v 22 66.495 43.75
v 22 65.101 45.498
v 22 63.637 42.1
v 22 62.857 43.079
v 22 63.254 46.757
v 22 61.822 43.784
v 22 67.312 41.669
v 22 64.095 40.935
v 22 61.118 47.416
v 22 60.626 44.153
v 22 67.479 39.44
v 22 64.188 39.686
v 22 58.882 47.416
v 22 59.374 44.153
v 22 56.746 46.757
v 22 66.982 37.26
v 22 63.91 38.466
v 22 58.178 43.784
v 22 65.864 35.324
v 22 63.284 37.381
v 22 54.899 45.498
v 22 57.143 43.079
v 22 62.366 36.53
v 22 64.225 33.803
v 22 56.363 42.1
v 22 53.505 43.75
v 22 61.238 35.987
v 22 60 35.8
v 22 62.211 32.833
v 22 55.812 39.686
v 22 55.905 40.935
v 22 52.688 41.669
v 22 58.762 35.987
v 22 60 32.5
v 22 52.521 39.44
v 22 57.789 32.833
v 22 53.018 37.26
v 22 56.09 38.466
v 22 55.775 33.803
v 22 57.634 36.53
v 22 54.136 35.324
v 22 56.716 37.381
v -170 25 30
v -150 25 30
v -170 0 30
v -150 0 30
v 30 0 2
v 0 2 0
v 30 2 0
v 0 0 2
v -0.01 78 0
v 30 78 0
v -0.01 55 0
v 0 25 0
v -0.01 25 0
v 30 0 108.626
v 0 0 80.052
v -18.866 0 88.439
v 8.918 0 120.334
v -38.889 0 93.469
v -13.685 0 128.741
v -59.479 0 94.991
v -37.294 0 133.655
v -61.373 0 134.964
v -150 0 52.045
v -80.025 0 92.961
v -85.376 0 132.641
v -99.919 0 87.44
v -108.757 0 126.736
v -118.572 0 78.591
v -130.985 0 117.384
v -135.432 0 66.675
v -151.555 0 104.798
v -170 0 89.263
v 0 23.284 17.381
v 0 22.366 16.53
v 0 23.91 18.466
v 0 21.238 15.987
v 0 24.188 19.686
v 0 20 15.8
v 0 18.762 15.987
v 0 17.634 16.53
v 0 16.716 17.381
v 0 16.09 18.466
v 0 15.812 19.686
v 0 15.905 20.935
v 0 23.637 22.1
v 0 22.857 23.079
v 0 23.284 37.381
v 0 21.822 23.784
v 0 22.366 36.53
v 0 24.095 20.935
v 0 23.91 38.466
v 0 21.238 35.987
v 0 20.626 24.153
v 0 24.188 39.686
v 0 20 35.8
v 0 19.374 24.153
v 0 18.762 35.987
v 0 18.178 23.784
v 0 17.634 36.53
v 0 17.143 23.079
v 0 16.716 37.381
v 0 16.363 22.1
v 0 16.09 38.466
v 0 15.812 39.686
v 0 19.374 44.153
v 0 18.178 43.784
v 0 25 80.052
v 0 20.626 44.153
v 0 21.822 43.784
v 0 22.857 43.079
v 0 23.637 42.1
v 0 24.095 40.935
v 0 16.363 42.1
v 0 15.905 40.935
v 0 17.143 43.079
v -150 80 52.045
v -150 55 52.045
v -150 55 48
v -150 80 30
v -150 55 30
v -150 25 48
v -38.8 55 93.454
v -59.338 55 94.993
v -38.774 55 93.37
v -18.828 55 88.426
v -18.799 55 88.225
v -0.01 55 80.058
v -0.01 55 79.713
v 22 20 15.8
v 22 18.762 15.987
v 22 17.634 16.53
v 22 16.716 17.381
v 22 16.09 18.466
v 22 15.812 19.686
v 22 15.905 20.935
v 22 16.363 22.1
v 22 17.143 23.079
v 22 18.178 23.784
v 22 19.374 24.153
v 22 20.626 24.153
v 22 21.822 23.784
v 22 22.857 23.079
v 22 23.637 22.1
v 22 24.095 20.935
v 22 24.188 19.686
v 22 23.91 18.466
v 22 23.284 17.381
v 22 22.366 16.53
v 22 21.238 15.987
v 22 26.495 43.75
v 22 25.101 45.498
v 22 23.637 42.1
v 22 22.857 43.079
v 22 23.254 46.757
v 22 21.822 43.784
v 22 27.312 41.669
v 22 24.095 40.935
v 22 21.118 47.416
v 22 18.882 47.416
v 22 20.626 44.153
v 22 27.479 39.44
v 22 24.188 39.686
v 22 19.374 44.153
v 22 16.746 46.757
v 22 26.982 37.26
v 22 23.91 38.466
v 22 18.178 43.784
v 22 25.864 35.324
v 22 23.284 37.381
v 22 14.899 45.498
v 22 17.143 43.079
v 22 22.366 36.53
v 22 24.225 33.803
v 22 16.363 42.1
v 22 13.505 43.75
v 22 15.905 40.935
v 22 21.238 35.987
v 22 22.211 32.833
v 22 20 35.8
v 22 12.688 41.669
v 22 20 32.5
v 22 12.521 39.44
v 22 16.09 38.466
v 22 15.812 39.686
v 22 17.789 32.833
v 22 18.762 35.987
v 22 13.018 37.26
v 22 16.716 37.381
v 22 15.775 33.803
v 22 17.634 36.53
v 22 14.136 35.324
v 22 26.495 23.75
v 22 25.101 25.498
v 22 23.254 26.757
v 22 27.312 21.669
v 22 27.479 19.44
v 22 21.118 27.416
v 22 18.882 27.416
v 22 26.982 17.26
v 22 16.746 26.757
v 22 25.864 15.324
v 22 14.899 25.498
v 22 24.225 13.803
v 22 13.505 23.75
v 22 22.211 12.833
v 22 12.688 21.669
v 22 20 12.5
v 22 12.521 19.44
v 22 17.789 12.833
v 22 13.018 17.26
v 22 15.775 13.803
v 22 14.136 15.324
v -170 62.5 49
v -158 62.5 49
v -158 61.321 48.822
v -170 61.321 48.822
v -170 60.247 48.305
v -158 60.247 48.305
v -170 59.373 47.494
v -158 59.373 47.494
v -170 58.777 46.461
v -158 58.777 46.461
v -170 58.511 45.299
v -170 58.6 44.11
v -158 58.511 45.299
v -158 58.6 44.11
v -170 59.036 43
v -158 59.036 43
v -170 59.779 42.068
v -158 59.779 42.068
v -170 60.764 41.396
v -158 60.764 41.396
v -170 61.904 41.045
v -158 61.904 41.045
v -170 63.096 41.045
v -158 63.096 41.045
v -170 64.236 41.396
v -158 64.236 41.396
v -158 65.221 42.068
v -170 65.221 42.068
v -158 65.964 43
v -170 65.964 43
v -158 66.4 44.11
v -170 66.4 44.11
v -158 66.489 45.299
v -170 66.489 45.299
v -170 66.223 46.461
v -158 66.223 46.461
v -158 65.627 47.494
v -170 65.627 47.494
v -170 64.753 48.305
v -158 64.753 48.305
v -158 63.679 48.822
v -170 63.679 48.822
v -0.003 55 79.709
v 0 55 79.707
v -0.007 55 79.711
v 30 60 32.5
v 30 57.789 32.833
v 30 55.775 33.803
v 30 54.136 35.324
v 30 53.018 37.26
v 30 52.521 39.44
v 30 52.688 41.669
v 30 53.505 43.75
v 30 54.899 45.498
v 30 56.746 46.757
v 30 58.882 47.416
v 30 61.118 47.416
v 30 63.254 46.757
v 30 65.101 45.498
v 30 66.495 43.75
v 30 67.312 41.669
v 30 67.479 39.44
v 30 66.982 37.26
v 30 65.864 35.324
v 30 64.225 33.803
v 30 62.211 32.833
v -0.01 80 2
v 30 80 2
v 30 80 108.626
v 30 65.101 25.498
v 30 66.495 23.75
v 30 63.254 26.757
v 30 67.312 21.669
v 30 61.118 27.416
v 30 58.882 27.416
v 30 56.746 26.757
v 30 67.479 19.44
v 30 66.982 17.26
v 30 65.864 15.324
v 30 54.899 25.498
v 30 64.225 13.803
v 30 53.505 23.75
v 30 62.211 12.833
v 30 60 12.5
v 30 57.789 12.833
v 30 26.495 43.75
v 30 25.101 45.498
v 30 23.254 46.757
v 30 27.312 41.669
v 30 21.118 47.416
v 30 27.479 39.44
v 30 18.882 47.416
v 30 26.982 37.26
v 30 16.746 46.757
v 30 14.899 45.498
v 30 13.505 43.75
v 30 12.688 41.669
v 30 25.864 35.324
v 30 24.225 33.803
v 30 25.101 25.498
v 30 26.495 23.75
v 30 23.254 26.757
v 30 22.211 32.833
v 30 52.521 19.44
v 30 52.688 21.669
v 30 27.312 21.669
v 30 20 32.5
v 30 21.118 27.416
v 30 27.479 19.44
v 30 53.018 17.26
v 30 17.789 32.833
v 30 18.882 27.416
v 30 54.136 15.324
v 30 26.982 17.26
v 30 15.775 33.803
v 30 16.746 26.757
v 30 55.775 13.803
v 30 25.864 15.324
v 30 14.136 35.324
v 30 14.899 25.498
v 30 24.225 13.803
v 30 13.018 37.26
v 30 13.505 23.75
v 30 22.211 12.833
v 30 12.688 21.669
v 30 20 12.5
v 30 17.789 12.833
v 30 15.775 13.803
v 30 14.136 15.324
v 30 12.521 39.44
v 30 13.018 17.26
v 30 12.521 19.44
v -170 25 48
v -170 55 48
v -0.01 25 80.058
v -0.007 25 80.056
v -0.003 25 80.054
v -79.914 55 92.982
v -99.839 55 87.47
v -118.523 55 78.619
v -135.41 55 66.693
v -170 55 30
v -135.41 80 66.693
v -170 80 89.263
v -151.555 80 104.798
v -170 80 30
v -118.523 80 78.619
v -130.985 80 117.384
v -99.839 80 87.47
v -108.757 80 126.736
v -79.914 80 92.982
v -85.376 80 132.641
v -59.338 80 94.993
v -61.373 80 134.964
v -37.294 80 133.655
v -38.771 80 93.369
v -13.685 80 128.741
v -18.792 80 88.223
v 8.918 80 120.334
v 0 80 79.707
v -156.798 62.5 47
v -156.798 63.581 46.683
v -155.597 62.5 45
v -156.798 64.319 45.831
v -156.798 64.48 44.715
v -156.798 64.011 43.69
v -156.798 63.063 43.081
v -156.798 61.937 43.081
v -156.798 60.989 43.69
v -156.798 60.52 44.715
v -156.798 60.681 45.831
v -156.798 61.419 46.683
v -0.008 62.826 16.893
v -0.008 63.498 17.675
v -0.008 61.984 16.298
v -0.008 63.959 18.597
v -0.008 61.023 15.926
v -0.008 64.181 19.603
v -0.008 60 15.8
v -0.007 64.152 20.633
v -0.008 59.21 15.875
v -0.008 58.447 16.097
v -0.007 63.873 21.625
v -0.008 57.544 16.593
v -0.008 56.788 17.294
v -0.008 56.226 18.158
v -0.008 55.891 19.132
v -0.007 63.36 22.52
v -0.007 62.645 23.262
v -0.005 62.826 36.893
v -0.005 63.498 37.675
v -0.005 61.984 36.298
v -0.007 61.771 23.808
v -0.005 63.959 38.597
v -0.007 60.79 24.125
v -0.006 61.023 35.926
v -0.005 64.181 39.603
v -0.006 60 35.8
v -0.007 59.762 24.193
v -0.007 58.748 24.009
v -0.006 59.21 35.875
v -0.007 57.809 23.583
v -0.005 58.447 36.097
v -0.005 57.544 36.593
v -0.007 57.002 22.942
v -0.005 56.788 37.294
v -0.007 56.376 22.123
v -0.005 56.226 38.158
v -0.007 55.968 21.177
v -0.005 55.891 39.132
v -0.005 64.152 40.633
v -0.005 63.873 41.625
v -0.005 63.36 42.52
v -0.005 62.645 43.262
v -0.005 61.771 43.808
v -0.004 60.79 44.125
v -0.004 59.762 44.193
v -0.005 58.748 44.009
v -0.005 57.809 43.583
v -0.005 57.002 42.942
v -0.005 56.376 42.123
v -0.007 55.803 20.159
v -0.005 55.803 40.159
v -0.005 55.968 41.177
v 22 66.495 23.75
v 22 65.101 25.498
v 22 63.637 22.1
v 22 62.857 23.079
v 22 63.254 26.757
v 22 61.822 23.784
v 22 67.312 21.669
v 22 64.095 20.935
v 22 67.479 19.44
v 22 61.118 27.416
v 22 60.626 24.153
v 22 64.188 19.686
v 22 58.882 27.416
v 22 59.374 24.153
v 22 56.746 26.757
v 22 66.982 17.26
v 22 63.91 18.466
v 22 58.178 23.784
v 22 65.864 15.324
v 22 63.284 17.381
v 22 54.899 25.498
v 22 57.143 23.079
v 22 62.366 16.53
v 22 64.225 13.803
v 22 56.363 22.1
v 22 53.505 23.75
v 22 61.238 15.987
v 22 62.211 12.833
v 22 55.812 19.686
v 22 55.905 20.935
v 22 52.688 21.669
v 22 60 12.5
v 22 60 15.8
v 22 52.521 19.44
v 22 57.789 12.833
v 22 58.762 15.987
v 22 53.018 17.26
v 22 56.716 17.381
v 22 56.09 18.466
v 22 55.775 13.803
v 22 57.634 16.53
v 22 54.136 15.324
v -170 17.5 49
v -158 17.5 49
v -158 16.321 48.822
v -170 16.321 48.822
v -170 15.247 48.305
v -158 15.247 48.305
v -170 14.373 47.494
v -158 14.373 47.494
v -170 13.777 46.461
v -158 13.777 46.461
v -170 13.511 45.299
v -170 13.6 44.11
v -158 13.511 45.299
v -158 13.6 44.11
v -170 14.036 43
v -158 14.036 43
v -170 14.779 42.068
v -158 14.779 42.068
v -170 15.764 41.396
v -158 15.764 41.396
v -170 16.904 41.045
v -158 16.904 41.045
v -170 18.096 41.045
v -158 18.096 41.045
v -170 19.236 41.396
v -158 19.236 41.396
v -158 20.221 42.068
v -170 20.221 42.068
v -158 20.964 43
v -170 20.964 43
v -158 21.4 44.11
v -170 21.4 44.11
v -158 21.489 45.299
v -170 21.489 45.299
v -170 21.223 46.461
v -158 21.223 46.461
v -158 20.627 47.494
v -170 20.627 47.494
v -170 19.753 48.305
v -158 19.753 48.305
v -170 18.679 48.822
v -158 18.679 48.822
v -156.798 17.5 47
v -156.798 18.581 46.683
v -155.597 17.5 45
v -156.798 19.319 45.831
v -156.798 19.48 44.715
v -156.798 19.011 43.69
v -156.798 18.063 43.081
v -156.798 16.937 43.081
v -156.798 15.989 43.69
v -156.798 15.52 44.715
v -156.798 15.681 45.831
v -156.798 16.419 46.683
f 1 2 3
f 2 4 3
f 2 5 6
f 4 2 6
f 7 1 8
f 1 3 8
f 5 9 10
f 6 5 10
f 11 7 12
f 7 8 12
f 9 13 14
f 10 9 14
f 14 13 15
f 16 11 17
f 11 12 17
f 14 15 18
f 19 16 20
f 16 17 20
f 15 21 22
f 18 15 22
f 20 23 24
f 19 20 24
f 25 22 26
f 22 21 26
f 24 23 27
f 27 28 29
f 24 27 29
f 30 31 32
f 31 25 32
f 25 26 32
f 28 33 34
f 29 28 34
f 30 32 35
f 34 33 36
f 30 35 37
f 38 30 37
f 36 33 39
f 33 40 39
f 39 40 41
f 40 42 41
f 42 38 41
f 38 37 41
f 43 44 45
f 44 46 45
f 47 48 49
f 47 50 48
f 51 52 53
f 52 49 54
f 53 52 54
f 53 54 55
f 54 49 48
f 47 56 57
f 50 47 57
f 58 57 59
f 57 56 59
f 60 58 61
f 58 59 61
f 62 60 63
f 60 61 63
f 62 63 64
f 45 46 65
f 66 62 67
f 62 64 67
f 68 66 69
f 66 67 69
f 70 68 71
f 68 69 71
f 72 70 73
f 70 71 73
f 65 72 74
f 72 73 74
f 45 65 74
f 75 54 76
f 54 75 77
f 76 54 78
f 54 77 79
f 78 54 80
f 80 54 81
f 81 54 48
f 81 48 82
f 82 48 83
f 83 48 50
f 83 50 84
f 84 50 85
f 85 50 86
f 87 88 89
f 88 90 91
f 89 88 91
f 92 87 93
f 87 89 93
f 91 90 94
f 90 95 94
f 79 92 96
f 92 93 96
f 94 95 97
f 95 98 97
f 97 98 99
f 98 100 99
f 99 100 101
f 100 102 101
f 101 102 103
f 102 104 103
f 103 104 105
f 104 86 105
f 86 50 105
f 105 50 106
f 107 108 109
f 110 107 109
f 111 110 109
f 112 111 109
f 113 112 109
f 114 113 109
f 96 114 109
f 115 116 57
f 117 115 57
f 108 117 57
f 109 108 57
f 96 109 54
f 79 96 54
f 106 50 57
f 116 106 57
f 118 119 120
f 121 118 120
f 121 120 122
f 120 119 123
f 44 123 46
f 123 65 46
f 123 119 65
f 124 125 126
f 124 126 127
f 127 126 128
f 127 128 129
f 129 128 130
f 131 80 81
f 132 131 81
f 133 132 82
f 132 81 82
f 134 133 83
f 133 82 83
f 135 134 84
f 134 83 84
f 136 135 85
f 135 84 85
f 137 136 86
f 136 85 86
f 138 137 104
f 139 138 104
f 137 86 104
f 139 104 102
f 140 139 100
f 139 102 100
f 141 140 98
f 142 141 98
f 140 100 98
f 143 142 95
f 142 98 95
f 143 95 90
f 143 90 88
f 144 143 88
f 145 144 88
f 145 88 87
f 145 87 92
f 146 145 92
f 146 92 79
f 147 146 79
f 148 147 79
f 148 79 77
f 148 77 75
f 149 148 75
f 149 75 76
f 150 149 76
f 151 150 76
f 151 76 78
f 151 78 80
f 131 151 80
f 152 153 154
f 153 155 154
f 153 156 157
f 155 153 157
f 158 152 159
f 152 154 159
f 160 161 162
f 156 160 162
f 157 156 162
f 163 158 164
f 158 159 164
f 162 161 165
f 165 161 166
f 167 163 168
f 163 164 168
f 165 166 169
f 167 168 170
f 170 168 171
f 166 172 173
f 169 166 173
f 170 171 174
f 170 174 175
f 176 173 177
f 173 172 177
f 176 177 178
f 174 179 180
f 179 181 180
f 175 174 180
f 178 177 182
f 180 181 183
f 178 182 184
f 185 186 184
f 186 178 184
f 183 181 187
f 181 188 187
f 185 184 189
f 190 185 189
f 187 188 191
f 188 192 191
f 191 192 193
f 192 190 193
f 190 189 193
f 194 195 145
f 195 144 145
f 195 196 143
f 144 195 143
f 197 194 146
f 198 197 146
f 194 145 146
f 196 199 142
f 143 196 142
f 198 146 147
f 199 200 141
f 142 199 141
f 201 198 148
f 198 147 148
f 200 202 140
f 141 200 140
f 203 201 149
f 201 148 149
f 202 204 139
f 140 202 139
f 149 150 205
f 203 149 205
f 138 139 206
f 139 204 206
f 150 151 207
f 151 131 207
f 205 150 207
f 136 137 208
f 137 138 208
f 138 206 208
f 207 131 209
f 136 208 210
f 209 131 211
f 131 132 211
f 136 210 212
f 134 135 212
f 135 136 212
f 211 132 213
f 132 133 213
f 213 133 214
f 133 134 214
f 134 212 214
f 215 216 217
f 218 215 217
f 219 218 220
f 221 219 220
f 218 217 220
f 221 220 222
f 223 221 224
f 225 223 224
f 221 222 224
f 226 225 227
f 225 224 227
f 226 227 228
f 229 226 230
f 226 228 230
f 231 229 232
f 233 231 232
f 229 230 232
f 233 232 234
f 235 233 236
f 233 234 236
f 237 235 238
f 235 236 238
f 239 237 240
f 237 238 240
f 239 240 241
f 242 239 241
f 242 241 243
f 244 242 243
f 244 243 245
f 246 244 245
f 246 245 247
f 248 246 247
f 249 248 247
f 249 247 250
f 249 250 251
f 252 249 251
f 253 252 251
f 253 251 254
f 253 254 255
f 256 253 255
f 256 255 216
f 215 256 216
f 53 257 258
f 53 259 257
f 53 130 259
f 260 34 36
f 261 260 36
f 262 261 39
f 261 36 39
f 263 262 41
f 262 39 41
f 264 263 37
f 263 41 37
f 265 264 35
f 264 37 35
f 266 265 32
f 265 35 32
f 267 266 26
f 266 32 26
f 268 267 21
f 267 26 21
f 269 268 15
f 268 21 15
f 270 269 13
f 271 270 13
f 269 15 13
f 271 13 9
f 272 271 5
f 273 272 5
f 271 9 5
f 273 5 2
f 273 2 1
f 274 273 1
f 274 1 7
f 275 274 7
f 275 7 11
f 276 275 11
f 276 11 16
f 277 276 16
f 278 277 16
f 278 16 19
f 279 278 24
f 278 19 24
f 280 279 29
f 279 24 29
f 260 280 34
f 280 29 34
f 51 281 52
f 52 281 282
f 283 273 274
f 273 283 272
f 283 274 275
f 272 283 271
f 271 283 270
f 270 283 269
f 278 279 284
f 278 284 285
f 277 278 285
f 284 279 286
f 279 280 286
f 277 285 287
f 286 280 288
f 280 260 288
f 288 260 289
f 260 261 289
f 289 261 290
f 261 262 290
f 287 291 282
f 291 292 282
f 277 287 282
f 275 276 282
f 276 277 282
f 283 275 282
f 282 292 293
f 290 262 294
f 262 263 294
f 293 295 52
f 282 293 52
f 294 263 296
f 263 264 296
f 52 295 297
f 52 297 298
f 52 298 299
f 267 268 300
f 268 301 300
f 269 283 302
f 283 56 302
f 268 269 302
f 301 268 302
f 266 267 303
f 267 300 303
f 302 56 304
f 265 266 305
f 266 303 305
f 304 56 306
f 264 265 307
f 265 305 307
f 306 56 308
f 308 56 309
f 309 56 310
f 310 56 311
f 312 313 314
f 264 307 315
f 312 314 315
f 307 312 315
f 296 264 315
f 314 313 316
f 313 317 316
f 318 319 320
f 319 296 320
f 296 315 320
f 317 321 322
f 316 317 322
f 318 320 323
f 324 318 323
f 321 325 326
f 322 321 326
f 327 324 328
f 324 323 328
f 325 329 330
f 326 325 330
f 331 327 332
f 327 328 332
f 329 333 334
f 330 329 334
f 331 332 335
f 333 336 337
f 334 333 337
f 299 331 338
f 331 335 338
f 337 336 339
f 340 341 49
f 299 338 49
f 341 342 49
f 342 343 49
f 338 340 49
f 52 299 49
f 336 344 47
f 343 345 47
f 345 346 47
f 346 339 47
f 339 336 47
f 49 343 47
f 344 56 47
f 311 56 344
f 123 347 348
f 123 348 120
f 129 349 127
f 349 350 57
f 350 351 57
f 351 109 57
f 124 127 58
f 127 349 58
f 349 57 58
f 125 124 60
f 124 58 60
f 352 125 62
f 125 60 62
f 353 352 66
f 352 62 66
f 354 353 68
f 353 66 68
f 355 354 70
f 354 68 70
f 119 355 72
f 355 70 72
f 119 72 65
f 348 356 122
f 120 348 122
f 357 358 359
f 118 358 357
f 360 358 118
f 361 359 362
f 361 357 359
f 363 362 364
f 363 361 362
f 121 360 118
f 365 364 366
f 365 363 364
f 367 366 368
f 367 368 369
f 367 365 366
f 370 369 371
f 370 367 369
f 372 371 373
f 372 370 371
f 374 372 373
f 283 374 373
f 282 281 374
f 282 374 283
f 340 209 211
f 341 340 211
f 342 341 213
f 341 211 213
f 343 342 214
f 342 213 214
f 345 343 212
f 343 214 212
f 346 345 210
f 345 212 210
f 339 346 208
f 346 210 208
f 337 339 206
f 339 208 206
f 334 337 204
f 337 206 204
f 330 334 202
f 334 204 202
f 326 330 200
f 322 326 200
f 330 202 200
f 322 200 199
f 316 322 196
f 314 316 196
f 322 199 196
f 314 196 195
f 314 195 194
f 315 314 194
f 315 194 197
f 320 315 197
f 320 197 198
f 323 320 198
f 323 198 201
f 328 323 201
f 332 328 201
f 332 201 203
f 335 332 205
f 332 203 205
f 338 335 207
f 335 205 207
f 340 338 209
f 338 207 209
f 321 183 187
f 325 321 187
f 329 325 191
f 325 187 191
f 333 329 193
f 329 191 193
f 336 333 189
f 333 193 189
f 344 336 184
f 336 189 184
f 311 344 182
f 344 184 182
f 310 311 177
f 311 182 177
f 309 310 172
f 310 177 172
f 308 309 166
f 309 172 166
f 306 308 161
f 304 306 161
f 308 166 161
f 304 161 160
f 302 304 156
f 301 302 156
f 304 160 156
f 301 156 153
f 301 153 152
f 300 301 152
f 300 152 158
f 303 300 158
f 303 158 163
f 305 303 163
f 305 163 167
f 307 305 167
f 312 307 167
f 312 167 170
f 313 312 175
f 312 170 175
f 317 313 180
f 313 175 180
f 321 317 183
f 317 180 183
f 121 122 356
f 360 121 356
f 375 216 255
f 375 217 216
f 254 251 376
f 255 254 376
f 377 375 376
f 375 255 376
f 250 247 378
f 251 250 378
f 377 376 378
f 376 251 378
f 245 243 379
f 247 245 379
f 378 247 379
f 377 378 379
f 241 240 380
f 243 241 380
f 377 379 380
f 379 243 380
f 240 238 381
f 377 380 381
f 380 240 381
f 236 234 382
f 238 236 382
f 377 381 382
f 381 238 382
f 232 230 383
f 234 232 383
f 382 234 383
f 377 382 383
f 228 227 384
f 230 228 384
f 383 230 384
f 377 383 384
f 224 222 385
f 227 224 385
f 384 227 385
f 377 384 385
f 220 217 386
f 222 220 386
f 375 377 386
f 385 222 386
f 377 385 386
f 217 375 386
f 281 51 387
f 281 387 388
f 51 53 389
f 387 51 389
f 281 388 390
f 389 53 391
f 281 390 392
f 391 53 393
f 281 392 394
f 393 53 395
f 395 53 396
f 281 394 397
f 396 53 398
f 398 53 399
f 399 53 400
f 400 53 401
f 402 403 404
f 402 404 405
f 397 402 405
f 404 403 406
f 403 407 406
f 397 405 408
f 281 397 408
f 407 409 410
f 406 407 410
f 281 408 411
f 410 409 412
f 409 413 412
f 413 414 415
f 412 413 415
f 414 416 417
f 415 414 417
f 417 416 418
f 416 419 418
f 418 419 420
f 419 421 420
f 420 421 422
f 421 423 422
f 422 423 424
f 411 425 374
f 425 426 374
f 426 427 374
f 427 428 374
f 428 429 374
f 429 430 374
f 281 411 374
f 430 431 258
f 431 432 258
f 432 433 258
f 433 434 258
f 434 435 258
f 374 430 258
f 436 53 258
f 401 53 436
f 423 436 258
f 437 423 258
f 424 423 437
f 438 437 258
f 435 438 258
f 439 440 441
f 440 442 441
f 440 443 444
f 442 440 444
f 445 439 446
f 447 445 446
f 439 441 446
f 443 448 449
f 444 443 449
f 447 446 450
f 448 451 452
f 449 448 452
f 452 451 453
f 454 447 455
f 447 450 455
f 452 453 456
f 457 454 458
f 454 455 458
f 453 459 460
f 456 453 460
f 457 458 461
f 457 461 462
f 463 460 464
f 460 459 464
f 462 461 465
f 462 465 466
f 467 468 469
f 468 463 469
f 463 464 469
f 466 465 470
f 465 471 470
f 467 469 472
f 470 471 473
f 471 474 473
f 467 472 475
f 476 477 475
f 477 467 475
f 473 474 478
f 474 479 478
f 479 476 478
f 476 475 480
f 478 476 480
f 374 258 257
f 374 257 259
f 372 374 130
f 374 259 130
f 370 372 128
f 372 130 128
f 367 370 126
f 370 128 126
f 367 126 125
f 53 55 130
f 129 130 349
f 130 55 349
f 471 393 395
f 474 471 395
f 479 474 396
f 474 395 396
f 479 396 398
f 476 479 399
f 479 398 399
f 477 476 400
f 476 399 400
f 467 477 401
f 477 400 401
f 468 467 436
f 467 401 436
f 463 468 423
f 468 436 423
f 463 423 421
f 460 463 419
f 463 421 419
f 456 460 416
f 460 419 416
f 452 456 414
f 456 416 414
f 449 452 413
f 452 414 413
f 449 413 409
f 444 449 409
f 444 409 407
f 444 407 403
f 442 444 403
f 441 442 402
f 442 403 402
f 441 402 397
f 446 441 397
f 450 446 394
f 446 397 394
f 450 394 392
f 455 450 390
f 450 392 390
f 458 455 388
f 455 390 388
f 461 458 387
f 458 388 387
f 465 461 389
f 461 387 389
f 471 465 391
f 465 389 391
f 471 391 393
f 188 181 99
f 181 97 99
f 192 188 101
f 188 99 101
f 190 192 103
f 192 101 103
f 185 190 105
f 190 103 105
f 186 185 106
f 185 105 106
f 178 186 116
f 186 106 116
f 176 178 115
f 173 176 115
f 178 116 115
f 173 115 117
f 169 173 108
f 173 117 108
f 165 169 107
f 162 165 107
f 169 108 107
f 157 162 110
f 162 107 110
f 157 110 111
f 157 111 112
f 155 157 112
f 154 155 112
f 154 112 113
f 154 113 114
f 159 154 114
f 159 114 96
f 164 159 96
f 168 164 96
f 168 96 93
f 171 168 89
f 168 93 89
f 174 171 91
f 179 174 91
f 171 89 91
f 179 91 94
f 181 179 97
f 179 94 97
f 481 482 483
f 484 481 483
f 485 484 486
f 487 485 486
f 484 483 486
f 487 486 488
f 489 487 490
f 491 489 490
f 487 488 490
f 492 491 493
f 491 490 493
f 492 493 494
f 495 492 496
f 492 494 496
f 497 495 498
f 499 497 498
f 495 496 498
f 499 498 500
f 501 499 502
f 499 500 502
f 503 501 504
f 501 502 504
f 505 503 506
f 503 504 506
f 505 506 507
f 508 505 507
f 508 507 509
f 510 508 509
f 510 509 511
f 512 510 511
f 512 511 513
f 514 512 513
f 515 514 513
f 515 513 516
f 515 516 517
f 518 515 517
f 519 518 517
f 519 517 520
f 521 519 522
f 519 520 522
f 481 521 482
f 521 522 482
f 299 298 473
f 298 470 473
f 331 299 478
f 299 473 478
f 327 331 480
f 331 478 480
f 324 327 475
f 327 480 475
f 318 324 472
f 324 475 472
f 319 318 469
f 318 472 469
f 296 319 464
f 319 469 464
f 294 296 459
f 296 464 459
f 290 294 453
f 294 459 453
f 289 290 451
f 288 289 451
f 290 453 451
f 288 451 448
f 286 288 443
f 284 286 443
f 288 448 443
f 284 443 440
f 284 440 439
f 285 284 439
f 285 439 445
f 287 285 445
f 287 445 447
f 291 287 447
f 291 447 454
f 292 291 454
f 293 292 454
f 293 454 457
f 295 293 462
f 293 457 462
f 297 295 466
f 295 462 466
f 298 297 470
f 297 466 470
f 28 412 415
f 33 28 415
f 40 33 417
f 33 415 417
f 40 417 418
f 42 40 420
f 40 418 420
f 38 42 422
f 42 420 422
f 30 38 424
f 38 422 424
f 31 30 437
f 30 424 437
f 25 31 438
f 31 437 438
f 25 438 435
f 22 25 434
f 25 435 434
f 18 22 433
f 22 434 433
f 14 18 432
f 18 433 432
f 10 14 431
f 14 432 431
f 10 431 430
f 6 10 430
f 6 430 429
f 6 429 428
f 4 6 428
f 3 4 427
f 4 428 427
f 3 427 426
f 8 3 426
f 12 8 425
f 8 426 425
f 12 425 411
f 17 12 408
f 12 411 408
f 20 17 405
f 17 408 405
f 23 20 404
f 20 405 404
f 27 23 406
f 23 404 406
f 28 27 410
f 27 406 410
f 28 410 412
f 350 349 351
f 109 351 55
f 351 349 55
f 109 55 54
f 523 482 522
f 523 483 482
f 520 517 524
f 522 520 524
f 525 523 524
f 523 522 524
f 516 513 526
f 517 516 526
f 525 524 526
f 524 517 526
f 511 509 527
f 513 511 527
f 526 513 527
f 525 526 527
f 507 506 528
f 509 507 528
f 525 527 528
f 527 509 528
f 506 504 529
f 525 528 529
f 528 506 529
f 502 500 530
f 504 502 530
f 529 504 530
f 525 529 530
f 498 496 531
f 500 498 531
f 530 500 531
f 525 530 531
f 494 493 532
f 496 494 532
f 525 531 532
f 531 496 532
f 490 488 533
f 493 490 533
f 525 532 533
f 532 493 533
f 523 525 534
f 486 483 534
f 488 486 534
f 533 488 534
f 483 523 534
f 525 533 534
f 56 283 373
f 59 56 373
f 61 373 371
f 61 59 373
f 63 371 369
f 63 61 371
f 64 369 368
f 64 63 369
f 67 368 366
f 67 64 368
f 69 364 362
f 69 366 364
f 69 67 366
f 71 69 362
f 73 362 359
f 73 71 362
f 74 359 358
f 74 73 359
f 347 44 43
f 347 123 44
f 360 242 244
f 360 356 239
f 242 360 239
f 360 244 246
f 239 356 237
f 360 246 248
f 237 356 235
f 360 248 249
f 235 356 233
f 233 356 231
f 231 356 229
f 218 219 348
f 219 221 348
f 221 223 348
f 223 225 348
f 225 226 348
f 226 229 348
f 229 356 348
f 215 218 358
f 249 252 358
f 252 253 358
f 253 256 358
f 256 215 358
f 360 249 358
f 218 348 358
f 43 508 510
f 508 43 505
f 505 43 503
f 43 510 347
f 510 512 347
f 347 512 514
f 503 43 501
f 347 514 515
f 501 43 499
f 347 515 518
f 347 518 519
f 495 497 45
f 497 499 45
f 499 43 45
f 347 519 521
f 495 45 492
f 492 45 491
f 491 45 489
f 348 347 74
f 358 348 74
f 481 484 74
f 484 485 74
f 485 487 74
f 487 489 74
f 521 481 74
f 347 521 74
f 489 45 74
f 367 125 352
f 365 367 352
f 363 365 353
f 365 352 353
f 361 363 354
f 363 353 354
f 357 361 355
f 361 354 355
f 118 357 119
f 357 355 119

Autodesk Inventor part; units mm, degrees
sketch "Sketch1" plane through (0, 0, 0) normal (0, 1, 0) x (-1, 0, 0)
  line L0 (0, 0) -> (-30, 0)
  arc A0 (170, 89.262855) -> (-30, 108.626345) centre (58, -25) ccw
  line L1 (-30, 0) -> (-30, 108.626345)
  line L2 (0, 0) -> (0, 80.052368)
  arc A1 (150, 52.045441) -> (0, 80.052368) centre (58, -25) ccw
  line L3 (170, 30) -> (170, 89.262855)
  line L4 (170, 0) -> (150, 0)
  line L5 (150, 52.045441) -> (150, 30)
  line L6 (150, 30) -> (170, 30)
  point P0 (-8.450723, -25)
  point P1 (160, 30)
  point P2 (160, 0)
  dimension "d0" = 30
  dimension "d1" = 25
  dimension "d3" = 320
  dimension "d137" = 30
ref_plane "Work Plane1" through (0, 0, 0) normal (-1, 0, 0) x (0, 0, 1)
ref_plane "Work Plane5" through (0, 26.089513, 40) normal (-1, 0, 0) x (0, 0, 1)
ref_plane "Work Plane4" through (0, 60, 20) normal (-1, 0, 0) x (0, 0, 1)
ref_plane "Work Plane2" through (-170, 0, 89.262855) normal (-1, 0, 0) x (0, 0, 1)
sketch "Sketch7" plane through (-170, 0, 89.262855) normal (-1, 0, 0) x (0, 0, 1)
  point P0 (-89.262855, 0)
ref_plane "Work Plane3" through (-170, 0, 0) normal (-1, 0, 0) x (0, 0, 1)
extrude "Extrusion4" add sketch "Sketch1" along normal blind 25
sketch "Sketch9" plane through (0, 25, 0) normal (0, 1, 0) x (1, 0, 0)
  line L0 (-170, 0) -> (-170, -89.262855)
  line L1 (-170, -48) -> (-150, -48)
  line L2 (-150, 0) -> (-170, 0)
  line L3 (-150, -48) -> (-150, -52.484587)
  line L4 (-170, -48) -> (-170, -89.262855)
  arc A0 (-150, -52.045441) -> (0, -80.052368) centre (-58, 25) ccw
  arc A1 (-150, -52.045441) -> (0, -80.052368) centre (-58, 25) ccw
  arc A2 (-170, -89.262855) -> (30, -108.626345) centre (-58, 25) ccw
  arc A3 (-170, -89.262855) -> (30, -108.626345) centre (-58, 25) ccw
  line L5 (-0.01, 0) -> (-0.01, -80.052368)
  line L6 (-0.01, -80.057888) -> (-0.01, 0)
  line L7 (30, 0) -> (-0.01, 0)
  line L8 (-0.01, 0) -> (30, 0)
  line L9 (30, -108.626345) -> (30, 0)
  line L10 (30, 0) -> (30, -108.626345)
  point P0 (0, 0)
  dimension "d79" = 20
  dimension "d80" = 48
extrude "Extrusion5" add sketch "Sketch9" along normal blind 30
sketch "Sketch10" plane through (0, 55, 0) normal (0, 1, 0) x (1, 0, 0)
  arc A0 (-150, -52.045441) -> (0, -79.707213) centre (-58.395171, 24.165786) ccw
  arc A1 (-170, -89.262855) -> (30, -108.626345) centre (-58, 25) ccw
  arc A2 (-170, -89.262855) -> (30, -108.626345) centre (-58, 25) ccw
  arc A3 (-150, -52.045441) -> (0, -80.052368) centre (-58, 25) ccw
  line L0 (-0.01, 0) -> (-0.01, -80.052368)
  line L1 (0, -80.052368) -> (-0.01, 0)
  line L2 (30, 0) -> (-0.01, 0)
  line L3 (-0.01, 0) -> (30, 0)
  line L4 (30, -108.626345) -> (30, 0)
  line L5 (30, 0) -> (30, -108.626345)
  line L6 (-170, 0) -> (-150, 0)
  line L7 (-170, -30) -> (-170, -89.262855)
  line L8 (-170, -89.262855) -> (-170, -30)
  line L9 (-150, -30) -> (-170, -30)
  line L10 (-170, -30) -> (-150, -30)
  line L11 (-150, -30) -> (-150, -52.045441)
  line L12 (-150, -48) -> (-150, -30)
  point P0 (0, 0)
  point P1 (-59.337804, -94.992543)
  point P2 (-0.000043, -79.707237)
  point P3 (-0.01, -79.712834)
sketch "Sketch10 outline for Extrusion6" plane through (0, 55, 0) normal (0, 1, 0) x (1, 0, 0)
  arc A0 (-0.000043, -79.707237) -> (-59.337804, -94.992543) centre (-58.395171, 24.165786) cw
  line L0 (-0.01, 0) -> (-0.000043, -79.707237)
  line L1 (30, 0) -> (-0.01, 0)
  line L2 (30, -108.626345) -> (30, 0)
  arc A1 (-170, -89.262855) -> (30, -108.626345) centre (-58, 25) ccw
  line L3 (-170, -30) -> (-170, -89.262855)
  line L4 (-150, -30) -> (-170, -30)
  line L5 (-150, -52.045441) -> (-150, -30)
  arc A2 (-59.337804, -94.992543) -> (-150, -52.045441) centre (-58, 25) cw
extrude "Extrusion6" add sketch "Sketch10 outline for Extrusion6" along normal blind 25
sketch "Sketch11" plane through (-0.01, 25, 0) normal (-1, 0, 0) x (0, 0, 1)
  point P0 (0, -25)
sketch "Sketch14" plane through (-0.01, 25, 0) normal (-1, 0, 0) x (0, 0, 1)
  point P0 (0, -25)
chamfer "Chamfer7" distance 2 angle 45 1 edges at (14.995, 80, 0) measured on face at (20, 80, 62.7779)
chamfer "Chamfer8" distance 2 angle 45 1 edges at (15, 0, 0) measured on face at (20, 0, 62.8929)
sketch "Sketch16" plane through (30, 0, 108.626345) normal (1, 0, 0) x (0, 0, -1)
  circle A0 centre (68.626345, 60) radius 7.5
  circle A1 centre (88.626345, 60) radius 7.5
  circle A2 centre (88.626345, 20) radius 7.5
  circle A3 centre (68.626345, 20) radius 7.5
  line L0 (108.626345, 2) -> (108.626345, 78)
  line L1 (0, 80) -> (106.626345, 80)
  line L2 (0, 0) -> (106.626345, 0)
  point P0 (108.626345, 0)
  dimension "d138" = 15
  dimension "d139" = 15
  dimension "d140" = 15
  dimension "d141" = 15
  dimension "d142" = 20
  dimension "d143" = 20
  dimension "d144" = 20
  dimension "d145" = 20
  dimension "d146" = 20
  dimension "d147" = 20
  dimension "d148" = 20
  dimension "d149" = 20
hole "Hole7" at (30, 20, 40) at (30, 60, 40) at (30, 60, 20) at (30, 20, 20) direction (-1, 0, 0) diameter 15 depth 8
sketch "Sketch17" plane through (30, 0, 108.626345) normal (1, 0, 0) x (0, 0, -1)
  circle A0 centre (68.626345, 60) radius 4.2
  circle A1 centre (68.626345, 20) radius 4.2
  circle A2 centre (88.626345, 20) radius 7.5
  circle A3 centre (88.626345, 20) radius 4.2
  circle A4 centre (88.626345, 60) radius 7.5
  circle A5 centre (88.626345, 60) radius 4.2
  line L0 (108.626345, 2) -> (108.626345, 78)
  line L1 (0, 80) -> (106.626345, 80)
  line L2 (0, 0) -> (106.626345, 0)
  point P0 (108.626345, 0)
  dimension "d157" = 8.4
  dimension "d158" = 8.4
  dimension "d159" = 8.4
  dimension "d160" = 8.4
  dimension "d161" = 40
  dimension "d162" = 20
  dimension "d163" = 40
  dimension "d164" = 20
hole "Hole8" at (30, 60, 40) at (30, 20, 40) at (30, 20, 20) at (30, 60, 20) direction (-1, 0, 0) diameter 8.4 depth 50
sketch "Sketch18" plane through (-170, 0, 30) normal (-1, 0, 0) x (0, 0, 1)
  circle A0 centre (15, 17.5) radius 4
  circle A1 centre (15, 62.5) radius 4
  line L0 (0, 0) -> (0, 25)
  line L1 (0, 55) -> (0, 80)
  line L2 (0, 0) -> (59.262855, 0)
  line L3 (0, 80) -> (59.262855, 80)
  point P0 (-30, 0)
  dimension "d172" = 8
  dimension "d173" = 8
  dimension "d174" = 15
  dimension "d175" = 15
  dimension "d176" = 17.5
  dimension "d177" = 17.5
  dimension "d178" = 45
hole "Hole9" at (-170, 17.5, 45) at (-170, 62.5, 45) direction (1, 0, 0) diameter 8 depth 12 tip angle 118
properties part number "Gestell" material "Steel, Mild"
